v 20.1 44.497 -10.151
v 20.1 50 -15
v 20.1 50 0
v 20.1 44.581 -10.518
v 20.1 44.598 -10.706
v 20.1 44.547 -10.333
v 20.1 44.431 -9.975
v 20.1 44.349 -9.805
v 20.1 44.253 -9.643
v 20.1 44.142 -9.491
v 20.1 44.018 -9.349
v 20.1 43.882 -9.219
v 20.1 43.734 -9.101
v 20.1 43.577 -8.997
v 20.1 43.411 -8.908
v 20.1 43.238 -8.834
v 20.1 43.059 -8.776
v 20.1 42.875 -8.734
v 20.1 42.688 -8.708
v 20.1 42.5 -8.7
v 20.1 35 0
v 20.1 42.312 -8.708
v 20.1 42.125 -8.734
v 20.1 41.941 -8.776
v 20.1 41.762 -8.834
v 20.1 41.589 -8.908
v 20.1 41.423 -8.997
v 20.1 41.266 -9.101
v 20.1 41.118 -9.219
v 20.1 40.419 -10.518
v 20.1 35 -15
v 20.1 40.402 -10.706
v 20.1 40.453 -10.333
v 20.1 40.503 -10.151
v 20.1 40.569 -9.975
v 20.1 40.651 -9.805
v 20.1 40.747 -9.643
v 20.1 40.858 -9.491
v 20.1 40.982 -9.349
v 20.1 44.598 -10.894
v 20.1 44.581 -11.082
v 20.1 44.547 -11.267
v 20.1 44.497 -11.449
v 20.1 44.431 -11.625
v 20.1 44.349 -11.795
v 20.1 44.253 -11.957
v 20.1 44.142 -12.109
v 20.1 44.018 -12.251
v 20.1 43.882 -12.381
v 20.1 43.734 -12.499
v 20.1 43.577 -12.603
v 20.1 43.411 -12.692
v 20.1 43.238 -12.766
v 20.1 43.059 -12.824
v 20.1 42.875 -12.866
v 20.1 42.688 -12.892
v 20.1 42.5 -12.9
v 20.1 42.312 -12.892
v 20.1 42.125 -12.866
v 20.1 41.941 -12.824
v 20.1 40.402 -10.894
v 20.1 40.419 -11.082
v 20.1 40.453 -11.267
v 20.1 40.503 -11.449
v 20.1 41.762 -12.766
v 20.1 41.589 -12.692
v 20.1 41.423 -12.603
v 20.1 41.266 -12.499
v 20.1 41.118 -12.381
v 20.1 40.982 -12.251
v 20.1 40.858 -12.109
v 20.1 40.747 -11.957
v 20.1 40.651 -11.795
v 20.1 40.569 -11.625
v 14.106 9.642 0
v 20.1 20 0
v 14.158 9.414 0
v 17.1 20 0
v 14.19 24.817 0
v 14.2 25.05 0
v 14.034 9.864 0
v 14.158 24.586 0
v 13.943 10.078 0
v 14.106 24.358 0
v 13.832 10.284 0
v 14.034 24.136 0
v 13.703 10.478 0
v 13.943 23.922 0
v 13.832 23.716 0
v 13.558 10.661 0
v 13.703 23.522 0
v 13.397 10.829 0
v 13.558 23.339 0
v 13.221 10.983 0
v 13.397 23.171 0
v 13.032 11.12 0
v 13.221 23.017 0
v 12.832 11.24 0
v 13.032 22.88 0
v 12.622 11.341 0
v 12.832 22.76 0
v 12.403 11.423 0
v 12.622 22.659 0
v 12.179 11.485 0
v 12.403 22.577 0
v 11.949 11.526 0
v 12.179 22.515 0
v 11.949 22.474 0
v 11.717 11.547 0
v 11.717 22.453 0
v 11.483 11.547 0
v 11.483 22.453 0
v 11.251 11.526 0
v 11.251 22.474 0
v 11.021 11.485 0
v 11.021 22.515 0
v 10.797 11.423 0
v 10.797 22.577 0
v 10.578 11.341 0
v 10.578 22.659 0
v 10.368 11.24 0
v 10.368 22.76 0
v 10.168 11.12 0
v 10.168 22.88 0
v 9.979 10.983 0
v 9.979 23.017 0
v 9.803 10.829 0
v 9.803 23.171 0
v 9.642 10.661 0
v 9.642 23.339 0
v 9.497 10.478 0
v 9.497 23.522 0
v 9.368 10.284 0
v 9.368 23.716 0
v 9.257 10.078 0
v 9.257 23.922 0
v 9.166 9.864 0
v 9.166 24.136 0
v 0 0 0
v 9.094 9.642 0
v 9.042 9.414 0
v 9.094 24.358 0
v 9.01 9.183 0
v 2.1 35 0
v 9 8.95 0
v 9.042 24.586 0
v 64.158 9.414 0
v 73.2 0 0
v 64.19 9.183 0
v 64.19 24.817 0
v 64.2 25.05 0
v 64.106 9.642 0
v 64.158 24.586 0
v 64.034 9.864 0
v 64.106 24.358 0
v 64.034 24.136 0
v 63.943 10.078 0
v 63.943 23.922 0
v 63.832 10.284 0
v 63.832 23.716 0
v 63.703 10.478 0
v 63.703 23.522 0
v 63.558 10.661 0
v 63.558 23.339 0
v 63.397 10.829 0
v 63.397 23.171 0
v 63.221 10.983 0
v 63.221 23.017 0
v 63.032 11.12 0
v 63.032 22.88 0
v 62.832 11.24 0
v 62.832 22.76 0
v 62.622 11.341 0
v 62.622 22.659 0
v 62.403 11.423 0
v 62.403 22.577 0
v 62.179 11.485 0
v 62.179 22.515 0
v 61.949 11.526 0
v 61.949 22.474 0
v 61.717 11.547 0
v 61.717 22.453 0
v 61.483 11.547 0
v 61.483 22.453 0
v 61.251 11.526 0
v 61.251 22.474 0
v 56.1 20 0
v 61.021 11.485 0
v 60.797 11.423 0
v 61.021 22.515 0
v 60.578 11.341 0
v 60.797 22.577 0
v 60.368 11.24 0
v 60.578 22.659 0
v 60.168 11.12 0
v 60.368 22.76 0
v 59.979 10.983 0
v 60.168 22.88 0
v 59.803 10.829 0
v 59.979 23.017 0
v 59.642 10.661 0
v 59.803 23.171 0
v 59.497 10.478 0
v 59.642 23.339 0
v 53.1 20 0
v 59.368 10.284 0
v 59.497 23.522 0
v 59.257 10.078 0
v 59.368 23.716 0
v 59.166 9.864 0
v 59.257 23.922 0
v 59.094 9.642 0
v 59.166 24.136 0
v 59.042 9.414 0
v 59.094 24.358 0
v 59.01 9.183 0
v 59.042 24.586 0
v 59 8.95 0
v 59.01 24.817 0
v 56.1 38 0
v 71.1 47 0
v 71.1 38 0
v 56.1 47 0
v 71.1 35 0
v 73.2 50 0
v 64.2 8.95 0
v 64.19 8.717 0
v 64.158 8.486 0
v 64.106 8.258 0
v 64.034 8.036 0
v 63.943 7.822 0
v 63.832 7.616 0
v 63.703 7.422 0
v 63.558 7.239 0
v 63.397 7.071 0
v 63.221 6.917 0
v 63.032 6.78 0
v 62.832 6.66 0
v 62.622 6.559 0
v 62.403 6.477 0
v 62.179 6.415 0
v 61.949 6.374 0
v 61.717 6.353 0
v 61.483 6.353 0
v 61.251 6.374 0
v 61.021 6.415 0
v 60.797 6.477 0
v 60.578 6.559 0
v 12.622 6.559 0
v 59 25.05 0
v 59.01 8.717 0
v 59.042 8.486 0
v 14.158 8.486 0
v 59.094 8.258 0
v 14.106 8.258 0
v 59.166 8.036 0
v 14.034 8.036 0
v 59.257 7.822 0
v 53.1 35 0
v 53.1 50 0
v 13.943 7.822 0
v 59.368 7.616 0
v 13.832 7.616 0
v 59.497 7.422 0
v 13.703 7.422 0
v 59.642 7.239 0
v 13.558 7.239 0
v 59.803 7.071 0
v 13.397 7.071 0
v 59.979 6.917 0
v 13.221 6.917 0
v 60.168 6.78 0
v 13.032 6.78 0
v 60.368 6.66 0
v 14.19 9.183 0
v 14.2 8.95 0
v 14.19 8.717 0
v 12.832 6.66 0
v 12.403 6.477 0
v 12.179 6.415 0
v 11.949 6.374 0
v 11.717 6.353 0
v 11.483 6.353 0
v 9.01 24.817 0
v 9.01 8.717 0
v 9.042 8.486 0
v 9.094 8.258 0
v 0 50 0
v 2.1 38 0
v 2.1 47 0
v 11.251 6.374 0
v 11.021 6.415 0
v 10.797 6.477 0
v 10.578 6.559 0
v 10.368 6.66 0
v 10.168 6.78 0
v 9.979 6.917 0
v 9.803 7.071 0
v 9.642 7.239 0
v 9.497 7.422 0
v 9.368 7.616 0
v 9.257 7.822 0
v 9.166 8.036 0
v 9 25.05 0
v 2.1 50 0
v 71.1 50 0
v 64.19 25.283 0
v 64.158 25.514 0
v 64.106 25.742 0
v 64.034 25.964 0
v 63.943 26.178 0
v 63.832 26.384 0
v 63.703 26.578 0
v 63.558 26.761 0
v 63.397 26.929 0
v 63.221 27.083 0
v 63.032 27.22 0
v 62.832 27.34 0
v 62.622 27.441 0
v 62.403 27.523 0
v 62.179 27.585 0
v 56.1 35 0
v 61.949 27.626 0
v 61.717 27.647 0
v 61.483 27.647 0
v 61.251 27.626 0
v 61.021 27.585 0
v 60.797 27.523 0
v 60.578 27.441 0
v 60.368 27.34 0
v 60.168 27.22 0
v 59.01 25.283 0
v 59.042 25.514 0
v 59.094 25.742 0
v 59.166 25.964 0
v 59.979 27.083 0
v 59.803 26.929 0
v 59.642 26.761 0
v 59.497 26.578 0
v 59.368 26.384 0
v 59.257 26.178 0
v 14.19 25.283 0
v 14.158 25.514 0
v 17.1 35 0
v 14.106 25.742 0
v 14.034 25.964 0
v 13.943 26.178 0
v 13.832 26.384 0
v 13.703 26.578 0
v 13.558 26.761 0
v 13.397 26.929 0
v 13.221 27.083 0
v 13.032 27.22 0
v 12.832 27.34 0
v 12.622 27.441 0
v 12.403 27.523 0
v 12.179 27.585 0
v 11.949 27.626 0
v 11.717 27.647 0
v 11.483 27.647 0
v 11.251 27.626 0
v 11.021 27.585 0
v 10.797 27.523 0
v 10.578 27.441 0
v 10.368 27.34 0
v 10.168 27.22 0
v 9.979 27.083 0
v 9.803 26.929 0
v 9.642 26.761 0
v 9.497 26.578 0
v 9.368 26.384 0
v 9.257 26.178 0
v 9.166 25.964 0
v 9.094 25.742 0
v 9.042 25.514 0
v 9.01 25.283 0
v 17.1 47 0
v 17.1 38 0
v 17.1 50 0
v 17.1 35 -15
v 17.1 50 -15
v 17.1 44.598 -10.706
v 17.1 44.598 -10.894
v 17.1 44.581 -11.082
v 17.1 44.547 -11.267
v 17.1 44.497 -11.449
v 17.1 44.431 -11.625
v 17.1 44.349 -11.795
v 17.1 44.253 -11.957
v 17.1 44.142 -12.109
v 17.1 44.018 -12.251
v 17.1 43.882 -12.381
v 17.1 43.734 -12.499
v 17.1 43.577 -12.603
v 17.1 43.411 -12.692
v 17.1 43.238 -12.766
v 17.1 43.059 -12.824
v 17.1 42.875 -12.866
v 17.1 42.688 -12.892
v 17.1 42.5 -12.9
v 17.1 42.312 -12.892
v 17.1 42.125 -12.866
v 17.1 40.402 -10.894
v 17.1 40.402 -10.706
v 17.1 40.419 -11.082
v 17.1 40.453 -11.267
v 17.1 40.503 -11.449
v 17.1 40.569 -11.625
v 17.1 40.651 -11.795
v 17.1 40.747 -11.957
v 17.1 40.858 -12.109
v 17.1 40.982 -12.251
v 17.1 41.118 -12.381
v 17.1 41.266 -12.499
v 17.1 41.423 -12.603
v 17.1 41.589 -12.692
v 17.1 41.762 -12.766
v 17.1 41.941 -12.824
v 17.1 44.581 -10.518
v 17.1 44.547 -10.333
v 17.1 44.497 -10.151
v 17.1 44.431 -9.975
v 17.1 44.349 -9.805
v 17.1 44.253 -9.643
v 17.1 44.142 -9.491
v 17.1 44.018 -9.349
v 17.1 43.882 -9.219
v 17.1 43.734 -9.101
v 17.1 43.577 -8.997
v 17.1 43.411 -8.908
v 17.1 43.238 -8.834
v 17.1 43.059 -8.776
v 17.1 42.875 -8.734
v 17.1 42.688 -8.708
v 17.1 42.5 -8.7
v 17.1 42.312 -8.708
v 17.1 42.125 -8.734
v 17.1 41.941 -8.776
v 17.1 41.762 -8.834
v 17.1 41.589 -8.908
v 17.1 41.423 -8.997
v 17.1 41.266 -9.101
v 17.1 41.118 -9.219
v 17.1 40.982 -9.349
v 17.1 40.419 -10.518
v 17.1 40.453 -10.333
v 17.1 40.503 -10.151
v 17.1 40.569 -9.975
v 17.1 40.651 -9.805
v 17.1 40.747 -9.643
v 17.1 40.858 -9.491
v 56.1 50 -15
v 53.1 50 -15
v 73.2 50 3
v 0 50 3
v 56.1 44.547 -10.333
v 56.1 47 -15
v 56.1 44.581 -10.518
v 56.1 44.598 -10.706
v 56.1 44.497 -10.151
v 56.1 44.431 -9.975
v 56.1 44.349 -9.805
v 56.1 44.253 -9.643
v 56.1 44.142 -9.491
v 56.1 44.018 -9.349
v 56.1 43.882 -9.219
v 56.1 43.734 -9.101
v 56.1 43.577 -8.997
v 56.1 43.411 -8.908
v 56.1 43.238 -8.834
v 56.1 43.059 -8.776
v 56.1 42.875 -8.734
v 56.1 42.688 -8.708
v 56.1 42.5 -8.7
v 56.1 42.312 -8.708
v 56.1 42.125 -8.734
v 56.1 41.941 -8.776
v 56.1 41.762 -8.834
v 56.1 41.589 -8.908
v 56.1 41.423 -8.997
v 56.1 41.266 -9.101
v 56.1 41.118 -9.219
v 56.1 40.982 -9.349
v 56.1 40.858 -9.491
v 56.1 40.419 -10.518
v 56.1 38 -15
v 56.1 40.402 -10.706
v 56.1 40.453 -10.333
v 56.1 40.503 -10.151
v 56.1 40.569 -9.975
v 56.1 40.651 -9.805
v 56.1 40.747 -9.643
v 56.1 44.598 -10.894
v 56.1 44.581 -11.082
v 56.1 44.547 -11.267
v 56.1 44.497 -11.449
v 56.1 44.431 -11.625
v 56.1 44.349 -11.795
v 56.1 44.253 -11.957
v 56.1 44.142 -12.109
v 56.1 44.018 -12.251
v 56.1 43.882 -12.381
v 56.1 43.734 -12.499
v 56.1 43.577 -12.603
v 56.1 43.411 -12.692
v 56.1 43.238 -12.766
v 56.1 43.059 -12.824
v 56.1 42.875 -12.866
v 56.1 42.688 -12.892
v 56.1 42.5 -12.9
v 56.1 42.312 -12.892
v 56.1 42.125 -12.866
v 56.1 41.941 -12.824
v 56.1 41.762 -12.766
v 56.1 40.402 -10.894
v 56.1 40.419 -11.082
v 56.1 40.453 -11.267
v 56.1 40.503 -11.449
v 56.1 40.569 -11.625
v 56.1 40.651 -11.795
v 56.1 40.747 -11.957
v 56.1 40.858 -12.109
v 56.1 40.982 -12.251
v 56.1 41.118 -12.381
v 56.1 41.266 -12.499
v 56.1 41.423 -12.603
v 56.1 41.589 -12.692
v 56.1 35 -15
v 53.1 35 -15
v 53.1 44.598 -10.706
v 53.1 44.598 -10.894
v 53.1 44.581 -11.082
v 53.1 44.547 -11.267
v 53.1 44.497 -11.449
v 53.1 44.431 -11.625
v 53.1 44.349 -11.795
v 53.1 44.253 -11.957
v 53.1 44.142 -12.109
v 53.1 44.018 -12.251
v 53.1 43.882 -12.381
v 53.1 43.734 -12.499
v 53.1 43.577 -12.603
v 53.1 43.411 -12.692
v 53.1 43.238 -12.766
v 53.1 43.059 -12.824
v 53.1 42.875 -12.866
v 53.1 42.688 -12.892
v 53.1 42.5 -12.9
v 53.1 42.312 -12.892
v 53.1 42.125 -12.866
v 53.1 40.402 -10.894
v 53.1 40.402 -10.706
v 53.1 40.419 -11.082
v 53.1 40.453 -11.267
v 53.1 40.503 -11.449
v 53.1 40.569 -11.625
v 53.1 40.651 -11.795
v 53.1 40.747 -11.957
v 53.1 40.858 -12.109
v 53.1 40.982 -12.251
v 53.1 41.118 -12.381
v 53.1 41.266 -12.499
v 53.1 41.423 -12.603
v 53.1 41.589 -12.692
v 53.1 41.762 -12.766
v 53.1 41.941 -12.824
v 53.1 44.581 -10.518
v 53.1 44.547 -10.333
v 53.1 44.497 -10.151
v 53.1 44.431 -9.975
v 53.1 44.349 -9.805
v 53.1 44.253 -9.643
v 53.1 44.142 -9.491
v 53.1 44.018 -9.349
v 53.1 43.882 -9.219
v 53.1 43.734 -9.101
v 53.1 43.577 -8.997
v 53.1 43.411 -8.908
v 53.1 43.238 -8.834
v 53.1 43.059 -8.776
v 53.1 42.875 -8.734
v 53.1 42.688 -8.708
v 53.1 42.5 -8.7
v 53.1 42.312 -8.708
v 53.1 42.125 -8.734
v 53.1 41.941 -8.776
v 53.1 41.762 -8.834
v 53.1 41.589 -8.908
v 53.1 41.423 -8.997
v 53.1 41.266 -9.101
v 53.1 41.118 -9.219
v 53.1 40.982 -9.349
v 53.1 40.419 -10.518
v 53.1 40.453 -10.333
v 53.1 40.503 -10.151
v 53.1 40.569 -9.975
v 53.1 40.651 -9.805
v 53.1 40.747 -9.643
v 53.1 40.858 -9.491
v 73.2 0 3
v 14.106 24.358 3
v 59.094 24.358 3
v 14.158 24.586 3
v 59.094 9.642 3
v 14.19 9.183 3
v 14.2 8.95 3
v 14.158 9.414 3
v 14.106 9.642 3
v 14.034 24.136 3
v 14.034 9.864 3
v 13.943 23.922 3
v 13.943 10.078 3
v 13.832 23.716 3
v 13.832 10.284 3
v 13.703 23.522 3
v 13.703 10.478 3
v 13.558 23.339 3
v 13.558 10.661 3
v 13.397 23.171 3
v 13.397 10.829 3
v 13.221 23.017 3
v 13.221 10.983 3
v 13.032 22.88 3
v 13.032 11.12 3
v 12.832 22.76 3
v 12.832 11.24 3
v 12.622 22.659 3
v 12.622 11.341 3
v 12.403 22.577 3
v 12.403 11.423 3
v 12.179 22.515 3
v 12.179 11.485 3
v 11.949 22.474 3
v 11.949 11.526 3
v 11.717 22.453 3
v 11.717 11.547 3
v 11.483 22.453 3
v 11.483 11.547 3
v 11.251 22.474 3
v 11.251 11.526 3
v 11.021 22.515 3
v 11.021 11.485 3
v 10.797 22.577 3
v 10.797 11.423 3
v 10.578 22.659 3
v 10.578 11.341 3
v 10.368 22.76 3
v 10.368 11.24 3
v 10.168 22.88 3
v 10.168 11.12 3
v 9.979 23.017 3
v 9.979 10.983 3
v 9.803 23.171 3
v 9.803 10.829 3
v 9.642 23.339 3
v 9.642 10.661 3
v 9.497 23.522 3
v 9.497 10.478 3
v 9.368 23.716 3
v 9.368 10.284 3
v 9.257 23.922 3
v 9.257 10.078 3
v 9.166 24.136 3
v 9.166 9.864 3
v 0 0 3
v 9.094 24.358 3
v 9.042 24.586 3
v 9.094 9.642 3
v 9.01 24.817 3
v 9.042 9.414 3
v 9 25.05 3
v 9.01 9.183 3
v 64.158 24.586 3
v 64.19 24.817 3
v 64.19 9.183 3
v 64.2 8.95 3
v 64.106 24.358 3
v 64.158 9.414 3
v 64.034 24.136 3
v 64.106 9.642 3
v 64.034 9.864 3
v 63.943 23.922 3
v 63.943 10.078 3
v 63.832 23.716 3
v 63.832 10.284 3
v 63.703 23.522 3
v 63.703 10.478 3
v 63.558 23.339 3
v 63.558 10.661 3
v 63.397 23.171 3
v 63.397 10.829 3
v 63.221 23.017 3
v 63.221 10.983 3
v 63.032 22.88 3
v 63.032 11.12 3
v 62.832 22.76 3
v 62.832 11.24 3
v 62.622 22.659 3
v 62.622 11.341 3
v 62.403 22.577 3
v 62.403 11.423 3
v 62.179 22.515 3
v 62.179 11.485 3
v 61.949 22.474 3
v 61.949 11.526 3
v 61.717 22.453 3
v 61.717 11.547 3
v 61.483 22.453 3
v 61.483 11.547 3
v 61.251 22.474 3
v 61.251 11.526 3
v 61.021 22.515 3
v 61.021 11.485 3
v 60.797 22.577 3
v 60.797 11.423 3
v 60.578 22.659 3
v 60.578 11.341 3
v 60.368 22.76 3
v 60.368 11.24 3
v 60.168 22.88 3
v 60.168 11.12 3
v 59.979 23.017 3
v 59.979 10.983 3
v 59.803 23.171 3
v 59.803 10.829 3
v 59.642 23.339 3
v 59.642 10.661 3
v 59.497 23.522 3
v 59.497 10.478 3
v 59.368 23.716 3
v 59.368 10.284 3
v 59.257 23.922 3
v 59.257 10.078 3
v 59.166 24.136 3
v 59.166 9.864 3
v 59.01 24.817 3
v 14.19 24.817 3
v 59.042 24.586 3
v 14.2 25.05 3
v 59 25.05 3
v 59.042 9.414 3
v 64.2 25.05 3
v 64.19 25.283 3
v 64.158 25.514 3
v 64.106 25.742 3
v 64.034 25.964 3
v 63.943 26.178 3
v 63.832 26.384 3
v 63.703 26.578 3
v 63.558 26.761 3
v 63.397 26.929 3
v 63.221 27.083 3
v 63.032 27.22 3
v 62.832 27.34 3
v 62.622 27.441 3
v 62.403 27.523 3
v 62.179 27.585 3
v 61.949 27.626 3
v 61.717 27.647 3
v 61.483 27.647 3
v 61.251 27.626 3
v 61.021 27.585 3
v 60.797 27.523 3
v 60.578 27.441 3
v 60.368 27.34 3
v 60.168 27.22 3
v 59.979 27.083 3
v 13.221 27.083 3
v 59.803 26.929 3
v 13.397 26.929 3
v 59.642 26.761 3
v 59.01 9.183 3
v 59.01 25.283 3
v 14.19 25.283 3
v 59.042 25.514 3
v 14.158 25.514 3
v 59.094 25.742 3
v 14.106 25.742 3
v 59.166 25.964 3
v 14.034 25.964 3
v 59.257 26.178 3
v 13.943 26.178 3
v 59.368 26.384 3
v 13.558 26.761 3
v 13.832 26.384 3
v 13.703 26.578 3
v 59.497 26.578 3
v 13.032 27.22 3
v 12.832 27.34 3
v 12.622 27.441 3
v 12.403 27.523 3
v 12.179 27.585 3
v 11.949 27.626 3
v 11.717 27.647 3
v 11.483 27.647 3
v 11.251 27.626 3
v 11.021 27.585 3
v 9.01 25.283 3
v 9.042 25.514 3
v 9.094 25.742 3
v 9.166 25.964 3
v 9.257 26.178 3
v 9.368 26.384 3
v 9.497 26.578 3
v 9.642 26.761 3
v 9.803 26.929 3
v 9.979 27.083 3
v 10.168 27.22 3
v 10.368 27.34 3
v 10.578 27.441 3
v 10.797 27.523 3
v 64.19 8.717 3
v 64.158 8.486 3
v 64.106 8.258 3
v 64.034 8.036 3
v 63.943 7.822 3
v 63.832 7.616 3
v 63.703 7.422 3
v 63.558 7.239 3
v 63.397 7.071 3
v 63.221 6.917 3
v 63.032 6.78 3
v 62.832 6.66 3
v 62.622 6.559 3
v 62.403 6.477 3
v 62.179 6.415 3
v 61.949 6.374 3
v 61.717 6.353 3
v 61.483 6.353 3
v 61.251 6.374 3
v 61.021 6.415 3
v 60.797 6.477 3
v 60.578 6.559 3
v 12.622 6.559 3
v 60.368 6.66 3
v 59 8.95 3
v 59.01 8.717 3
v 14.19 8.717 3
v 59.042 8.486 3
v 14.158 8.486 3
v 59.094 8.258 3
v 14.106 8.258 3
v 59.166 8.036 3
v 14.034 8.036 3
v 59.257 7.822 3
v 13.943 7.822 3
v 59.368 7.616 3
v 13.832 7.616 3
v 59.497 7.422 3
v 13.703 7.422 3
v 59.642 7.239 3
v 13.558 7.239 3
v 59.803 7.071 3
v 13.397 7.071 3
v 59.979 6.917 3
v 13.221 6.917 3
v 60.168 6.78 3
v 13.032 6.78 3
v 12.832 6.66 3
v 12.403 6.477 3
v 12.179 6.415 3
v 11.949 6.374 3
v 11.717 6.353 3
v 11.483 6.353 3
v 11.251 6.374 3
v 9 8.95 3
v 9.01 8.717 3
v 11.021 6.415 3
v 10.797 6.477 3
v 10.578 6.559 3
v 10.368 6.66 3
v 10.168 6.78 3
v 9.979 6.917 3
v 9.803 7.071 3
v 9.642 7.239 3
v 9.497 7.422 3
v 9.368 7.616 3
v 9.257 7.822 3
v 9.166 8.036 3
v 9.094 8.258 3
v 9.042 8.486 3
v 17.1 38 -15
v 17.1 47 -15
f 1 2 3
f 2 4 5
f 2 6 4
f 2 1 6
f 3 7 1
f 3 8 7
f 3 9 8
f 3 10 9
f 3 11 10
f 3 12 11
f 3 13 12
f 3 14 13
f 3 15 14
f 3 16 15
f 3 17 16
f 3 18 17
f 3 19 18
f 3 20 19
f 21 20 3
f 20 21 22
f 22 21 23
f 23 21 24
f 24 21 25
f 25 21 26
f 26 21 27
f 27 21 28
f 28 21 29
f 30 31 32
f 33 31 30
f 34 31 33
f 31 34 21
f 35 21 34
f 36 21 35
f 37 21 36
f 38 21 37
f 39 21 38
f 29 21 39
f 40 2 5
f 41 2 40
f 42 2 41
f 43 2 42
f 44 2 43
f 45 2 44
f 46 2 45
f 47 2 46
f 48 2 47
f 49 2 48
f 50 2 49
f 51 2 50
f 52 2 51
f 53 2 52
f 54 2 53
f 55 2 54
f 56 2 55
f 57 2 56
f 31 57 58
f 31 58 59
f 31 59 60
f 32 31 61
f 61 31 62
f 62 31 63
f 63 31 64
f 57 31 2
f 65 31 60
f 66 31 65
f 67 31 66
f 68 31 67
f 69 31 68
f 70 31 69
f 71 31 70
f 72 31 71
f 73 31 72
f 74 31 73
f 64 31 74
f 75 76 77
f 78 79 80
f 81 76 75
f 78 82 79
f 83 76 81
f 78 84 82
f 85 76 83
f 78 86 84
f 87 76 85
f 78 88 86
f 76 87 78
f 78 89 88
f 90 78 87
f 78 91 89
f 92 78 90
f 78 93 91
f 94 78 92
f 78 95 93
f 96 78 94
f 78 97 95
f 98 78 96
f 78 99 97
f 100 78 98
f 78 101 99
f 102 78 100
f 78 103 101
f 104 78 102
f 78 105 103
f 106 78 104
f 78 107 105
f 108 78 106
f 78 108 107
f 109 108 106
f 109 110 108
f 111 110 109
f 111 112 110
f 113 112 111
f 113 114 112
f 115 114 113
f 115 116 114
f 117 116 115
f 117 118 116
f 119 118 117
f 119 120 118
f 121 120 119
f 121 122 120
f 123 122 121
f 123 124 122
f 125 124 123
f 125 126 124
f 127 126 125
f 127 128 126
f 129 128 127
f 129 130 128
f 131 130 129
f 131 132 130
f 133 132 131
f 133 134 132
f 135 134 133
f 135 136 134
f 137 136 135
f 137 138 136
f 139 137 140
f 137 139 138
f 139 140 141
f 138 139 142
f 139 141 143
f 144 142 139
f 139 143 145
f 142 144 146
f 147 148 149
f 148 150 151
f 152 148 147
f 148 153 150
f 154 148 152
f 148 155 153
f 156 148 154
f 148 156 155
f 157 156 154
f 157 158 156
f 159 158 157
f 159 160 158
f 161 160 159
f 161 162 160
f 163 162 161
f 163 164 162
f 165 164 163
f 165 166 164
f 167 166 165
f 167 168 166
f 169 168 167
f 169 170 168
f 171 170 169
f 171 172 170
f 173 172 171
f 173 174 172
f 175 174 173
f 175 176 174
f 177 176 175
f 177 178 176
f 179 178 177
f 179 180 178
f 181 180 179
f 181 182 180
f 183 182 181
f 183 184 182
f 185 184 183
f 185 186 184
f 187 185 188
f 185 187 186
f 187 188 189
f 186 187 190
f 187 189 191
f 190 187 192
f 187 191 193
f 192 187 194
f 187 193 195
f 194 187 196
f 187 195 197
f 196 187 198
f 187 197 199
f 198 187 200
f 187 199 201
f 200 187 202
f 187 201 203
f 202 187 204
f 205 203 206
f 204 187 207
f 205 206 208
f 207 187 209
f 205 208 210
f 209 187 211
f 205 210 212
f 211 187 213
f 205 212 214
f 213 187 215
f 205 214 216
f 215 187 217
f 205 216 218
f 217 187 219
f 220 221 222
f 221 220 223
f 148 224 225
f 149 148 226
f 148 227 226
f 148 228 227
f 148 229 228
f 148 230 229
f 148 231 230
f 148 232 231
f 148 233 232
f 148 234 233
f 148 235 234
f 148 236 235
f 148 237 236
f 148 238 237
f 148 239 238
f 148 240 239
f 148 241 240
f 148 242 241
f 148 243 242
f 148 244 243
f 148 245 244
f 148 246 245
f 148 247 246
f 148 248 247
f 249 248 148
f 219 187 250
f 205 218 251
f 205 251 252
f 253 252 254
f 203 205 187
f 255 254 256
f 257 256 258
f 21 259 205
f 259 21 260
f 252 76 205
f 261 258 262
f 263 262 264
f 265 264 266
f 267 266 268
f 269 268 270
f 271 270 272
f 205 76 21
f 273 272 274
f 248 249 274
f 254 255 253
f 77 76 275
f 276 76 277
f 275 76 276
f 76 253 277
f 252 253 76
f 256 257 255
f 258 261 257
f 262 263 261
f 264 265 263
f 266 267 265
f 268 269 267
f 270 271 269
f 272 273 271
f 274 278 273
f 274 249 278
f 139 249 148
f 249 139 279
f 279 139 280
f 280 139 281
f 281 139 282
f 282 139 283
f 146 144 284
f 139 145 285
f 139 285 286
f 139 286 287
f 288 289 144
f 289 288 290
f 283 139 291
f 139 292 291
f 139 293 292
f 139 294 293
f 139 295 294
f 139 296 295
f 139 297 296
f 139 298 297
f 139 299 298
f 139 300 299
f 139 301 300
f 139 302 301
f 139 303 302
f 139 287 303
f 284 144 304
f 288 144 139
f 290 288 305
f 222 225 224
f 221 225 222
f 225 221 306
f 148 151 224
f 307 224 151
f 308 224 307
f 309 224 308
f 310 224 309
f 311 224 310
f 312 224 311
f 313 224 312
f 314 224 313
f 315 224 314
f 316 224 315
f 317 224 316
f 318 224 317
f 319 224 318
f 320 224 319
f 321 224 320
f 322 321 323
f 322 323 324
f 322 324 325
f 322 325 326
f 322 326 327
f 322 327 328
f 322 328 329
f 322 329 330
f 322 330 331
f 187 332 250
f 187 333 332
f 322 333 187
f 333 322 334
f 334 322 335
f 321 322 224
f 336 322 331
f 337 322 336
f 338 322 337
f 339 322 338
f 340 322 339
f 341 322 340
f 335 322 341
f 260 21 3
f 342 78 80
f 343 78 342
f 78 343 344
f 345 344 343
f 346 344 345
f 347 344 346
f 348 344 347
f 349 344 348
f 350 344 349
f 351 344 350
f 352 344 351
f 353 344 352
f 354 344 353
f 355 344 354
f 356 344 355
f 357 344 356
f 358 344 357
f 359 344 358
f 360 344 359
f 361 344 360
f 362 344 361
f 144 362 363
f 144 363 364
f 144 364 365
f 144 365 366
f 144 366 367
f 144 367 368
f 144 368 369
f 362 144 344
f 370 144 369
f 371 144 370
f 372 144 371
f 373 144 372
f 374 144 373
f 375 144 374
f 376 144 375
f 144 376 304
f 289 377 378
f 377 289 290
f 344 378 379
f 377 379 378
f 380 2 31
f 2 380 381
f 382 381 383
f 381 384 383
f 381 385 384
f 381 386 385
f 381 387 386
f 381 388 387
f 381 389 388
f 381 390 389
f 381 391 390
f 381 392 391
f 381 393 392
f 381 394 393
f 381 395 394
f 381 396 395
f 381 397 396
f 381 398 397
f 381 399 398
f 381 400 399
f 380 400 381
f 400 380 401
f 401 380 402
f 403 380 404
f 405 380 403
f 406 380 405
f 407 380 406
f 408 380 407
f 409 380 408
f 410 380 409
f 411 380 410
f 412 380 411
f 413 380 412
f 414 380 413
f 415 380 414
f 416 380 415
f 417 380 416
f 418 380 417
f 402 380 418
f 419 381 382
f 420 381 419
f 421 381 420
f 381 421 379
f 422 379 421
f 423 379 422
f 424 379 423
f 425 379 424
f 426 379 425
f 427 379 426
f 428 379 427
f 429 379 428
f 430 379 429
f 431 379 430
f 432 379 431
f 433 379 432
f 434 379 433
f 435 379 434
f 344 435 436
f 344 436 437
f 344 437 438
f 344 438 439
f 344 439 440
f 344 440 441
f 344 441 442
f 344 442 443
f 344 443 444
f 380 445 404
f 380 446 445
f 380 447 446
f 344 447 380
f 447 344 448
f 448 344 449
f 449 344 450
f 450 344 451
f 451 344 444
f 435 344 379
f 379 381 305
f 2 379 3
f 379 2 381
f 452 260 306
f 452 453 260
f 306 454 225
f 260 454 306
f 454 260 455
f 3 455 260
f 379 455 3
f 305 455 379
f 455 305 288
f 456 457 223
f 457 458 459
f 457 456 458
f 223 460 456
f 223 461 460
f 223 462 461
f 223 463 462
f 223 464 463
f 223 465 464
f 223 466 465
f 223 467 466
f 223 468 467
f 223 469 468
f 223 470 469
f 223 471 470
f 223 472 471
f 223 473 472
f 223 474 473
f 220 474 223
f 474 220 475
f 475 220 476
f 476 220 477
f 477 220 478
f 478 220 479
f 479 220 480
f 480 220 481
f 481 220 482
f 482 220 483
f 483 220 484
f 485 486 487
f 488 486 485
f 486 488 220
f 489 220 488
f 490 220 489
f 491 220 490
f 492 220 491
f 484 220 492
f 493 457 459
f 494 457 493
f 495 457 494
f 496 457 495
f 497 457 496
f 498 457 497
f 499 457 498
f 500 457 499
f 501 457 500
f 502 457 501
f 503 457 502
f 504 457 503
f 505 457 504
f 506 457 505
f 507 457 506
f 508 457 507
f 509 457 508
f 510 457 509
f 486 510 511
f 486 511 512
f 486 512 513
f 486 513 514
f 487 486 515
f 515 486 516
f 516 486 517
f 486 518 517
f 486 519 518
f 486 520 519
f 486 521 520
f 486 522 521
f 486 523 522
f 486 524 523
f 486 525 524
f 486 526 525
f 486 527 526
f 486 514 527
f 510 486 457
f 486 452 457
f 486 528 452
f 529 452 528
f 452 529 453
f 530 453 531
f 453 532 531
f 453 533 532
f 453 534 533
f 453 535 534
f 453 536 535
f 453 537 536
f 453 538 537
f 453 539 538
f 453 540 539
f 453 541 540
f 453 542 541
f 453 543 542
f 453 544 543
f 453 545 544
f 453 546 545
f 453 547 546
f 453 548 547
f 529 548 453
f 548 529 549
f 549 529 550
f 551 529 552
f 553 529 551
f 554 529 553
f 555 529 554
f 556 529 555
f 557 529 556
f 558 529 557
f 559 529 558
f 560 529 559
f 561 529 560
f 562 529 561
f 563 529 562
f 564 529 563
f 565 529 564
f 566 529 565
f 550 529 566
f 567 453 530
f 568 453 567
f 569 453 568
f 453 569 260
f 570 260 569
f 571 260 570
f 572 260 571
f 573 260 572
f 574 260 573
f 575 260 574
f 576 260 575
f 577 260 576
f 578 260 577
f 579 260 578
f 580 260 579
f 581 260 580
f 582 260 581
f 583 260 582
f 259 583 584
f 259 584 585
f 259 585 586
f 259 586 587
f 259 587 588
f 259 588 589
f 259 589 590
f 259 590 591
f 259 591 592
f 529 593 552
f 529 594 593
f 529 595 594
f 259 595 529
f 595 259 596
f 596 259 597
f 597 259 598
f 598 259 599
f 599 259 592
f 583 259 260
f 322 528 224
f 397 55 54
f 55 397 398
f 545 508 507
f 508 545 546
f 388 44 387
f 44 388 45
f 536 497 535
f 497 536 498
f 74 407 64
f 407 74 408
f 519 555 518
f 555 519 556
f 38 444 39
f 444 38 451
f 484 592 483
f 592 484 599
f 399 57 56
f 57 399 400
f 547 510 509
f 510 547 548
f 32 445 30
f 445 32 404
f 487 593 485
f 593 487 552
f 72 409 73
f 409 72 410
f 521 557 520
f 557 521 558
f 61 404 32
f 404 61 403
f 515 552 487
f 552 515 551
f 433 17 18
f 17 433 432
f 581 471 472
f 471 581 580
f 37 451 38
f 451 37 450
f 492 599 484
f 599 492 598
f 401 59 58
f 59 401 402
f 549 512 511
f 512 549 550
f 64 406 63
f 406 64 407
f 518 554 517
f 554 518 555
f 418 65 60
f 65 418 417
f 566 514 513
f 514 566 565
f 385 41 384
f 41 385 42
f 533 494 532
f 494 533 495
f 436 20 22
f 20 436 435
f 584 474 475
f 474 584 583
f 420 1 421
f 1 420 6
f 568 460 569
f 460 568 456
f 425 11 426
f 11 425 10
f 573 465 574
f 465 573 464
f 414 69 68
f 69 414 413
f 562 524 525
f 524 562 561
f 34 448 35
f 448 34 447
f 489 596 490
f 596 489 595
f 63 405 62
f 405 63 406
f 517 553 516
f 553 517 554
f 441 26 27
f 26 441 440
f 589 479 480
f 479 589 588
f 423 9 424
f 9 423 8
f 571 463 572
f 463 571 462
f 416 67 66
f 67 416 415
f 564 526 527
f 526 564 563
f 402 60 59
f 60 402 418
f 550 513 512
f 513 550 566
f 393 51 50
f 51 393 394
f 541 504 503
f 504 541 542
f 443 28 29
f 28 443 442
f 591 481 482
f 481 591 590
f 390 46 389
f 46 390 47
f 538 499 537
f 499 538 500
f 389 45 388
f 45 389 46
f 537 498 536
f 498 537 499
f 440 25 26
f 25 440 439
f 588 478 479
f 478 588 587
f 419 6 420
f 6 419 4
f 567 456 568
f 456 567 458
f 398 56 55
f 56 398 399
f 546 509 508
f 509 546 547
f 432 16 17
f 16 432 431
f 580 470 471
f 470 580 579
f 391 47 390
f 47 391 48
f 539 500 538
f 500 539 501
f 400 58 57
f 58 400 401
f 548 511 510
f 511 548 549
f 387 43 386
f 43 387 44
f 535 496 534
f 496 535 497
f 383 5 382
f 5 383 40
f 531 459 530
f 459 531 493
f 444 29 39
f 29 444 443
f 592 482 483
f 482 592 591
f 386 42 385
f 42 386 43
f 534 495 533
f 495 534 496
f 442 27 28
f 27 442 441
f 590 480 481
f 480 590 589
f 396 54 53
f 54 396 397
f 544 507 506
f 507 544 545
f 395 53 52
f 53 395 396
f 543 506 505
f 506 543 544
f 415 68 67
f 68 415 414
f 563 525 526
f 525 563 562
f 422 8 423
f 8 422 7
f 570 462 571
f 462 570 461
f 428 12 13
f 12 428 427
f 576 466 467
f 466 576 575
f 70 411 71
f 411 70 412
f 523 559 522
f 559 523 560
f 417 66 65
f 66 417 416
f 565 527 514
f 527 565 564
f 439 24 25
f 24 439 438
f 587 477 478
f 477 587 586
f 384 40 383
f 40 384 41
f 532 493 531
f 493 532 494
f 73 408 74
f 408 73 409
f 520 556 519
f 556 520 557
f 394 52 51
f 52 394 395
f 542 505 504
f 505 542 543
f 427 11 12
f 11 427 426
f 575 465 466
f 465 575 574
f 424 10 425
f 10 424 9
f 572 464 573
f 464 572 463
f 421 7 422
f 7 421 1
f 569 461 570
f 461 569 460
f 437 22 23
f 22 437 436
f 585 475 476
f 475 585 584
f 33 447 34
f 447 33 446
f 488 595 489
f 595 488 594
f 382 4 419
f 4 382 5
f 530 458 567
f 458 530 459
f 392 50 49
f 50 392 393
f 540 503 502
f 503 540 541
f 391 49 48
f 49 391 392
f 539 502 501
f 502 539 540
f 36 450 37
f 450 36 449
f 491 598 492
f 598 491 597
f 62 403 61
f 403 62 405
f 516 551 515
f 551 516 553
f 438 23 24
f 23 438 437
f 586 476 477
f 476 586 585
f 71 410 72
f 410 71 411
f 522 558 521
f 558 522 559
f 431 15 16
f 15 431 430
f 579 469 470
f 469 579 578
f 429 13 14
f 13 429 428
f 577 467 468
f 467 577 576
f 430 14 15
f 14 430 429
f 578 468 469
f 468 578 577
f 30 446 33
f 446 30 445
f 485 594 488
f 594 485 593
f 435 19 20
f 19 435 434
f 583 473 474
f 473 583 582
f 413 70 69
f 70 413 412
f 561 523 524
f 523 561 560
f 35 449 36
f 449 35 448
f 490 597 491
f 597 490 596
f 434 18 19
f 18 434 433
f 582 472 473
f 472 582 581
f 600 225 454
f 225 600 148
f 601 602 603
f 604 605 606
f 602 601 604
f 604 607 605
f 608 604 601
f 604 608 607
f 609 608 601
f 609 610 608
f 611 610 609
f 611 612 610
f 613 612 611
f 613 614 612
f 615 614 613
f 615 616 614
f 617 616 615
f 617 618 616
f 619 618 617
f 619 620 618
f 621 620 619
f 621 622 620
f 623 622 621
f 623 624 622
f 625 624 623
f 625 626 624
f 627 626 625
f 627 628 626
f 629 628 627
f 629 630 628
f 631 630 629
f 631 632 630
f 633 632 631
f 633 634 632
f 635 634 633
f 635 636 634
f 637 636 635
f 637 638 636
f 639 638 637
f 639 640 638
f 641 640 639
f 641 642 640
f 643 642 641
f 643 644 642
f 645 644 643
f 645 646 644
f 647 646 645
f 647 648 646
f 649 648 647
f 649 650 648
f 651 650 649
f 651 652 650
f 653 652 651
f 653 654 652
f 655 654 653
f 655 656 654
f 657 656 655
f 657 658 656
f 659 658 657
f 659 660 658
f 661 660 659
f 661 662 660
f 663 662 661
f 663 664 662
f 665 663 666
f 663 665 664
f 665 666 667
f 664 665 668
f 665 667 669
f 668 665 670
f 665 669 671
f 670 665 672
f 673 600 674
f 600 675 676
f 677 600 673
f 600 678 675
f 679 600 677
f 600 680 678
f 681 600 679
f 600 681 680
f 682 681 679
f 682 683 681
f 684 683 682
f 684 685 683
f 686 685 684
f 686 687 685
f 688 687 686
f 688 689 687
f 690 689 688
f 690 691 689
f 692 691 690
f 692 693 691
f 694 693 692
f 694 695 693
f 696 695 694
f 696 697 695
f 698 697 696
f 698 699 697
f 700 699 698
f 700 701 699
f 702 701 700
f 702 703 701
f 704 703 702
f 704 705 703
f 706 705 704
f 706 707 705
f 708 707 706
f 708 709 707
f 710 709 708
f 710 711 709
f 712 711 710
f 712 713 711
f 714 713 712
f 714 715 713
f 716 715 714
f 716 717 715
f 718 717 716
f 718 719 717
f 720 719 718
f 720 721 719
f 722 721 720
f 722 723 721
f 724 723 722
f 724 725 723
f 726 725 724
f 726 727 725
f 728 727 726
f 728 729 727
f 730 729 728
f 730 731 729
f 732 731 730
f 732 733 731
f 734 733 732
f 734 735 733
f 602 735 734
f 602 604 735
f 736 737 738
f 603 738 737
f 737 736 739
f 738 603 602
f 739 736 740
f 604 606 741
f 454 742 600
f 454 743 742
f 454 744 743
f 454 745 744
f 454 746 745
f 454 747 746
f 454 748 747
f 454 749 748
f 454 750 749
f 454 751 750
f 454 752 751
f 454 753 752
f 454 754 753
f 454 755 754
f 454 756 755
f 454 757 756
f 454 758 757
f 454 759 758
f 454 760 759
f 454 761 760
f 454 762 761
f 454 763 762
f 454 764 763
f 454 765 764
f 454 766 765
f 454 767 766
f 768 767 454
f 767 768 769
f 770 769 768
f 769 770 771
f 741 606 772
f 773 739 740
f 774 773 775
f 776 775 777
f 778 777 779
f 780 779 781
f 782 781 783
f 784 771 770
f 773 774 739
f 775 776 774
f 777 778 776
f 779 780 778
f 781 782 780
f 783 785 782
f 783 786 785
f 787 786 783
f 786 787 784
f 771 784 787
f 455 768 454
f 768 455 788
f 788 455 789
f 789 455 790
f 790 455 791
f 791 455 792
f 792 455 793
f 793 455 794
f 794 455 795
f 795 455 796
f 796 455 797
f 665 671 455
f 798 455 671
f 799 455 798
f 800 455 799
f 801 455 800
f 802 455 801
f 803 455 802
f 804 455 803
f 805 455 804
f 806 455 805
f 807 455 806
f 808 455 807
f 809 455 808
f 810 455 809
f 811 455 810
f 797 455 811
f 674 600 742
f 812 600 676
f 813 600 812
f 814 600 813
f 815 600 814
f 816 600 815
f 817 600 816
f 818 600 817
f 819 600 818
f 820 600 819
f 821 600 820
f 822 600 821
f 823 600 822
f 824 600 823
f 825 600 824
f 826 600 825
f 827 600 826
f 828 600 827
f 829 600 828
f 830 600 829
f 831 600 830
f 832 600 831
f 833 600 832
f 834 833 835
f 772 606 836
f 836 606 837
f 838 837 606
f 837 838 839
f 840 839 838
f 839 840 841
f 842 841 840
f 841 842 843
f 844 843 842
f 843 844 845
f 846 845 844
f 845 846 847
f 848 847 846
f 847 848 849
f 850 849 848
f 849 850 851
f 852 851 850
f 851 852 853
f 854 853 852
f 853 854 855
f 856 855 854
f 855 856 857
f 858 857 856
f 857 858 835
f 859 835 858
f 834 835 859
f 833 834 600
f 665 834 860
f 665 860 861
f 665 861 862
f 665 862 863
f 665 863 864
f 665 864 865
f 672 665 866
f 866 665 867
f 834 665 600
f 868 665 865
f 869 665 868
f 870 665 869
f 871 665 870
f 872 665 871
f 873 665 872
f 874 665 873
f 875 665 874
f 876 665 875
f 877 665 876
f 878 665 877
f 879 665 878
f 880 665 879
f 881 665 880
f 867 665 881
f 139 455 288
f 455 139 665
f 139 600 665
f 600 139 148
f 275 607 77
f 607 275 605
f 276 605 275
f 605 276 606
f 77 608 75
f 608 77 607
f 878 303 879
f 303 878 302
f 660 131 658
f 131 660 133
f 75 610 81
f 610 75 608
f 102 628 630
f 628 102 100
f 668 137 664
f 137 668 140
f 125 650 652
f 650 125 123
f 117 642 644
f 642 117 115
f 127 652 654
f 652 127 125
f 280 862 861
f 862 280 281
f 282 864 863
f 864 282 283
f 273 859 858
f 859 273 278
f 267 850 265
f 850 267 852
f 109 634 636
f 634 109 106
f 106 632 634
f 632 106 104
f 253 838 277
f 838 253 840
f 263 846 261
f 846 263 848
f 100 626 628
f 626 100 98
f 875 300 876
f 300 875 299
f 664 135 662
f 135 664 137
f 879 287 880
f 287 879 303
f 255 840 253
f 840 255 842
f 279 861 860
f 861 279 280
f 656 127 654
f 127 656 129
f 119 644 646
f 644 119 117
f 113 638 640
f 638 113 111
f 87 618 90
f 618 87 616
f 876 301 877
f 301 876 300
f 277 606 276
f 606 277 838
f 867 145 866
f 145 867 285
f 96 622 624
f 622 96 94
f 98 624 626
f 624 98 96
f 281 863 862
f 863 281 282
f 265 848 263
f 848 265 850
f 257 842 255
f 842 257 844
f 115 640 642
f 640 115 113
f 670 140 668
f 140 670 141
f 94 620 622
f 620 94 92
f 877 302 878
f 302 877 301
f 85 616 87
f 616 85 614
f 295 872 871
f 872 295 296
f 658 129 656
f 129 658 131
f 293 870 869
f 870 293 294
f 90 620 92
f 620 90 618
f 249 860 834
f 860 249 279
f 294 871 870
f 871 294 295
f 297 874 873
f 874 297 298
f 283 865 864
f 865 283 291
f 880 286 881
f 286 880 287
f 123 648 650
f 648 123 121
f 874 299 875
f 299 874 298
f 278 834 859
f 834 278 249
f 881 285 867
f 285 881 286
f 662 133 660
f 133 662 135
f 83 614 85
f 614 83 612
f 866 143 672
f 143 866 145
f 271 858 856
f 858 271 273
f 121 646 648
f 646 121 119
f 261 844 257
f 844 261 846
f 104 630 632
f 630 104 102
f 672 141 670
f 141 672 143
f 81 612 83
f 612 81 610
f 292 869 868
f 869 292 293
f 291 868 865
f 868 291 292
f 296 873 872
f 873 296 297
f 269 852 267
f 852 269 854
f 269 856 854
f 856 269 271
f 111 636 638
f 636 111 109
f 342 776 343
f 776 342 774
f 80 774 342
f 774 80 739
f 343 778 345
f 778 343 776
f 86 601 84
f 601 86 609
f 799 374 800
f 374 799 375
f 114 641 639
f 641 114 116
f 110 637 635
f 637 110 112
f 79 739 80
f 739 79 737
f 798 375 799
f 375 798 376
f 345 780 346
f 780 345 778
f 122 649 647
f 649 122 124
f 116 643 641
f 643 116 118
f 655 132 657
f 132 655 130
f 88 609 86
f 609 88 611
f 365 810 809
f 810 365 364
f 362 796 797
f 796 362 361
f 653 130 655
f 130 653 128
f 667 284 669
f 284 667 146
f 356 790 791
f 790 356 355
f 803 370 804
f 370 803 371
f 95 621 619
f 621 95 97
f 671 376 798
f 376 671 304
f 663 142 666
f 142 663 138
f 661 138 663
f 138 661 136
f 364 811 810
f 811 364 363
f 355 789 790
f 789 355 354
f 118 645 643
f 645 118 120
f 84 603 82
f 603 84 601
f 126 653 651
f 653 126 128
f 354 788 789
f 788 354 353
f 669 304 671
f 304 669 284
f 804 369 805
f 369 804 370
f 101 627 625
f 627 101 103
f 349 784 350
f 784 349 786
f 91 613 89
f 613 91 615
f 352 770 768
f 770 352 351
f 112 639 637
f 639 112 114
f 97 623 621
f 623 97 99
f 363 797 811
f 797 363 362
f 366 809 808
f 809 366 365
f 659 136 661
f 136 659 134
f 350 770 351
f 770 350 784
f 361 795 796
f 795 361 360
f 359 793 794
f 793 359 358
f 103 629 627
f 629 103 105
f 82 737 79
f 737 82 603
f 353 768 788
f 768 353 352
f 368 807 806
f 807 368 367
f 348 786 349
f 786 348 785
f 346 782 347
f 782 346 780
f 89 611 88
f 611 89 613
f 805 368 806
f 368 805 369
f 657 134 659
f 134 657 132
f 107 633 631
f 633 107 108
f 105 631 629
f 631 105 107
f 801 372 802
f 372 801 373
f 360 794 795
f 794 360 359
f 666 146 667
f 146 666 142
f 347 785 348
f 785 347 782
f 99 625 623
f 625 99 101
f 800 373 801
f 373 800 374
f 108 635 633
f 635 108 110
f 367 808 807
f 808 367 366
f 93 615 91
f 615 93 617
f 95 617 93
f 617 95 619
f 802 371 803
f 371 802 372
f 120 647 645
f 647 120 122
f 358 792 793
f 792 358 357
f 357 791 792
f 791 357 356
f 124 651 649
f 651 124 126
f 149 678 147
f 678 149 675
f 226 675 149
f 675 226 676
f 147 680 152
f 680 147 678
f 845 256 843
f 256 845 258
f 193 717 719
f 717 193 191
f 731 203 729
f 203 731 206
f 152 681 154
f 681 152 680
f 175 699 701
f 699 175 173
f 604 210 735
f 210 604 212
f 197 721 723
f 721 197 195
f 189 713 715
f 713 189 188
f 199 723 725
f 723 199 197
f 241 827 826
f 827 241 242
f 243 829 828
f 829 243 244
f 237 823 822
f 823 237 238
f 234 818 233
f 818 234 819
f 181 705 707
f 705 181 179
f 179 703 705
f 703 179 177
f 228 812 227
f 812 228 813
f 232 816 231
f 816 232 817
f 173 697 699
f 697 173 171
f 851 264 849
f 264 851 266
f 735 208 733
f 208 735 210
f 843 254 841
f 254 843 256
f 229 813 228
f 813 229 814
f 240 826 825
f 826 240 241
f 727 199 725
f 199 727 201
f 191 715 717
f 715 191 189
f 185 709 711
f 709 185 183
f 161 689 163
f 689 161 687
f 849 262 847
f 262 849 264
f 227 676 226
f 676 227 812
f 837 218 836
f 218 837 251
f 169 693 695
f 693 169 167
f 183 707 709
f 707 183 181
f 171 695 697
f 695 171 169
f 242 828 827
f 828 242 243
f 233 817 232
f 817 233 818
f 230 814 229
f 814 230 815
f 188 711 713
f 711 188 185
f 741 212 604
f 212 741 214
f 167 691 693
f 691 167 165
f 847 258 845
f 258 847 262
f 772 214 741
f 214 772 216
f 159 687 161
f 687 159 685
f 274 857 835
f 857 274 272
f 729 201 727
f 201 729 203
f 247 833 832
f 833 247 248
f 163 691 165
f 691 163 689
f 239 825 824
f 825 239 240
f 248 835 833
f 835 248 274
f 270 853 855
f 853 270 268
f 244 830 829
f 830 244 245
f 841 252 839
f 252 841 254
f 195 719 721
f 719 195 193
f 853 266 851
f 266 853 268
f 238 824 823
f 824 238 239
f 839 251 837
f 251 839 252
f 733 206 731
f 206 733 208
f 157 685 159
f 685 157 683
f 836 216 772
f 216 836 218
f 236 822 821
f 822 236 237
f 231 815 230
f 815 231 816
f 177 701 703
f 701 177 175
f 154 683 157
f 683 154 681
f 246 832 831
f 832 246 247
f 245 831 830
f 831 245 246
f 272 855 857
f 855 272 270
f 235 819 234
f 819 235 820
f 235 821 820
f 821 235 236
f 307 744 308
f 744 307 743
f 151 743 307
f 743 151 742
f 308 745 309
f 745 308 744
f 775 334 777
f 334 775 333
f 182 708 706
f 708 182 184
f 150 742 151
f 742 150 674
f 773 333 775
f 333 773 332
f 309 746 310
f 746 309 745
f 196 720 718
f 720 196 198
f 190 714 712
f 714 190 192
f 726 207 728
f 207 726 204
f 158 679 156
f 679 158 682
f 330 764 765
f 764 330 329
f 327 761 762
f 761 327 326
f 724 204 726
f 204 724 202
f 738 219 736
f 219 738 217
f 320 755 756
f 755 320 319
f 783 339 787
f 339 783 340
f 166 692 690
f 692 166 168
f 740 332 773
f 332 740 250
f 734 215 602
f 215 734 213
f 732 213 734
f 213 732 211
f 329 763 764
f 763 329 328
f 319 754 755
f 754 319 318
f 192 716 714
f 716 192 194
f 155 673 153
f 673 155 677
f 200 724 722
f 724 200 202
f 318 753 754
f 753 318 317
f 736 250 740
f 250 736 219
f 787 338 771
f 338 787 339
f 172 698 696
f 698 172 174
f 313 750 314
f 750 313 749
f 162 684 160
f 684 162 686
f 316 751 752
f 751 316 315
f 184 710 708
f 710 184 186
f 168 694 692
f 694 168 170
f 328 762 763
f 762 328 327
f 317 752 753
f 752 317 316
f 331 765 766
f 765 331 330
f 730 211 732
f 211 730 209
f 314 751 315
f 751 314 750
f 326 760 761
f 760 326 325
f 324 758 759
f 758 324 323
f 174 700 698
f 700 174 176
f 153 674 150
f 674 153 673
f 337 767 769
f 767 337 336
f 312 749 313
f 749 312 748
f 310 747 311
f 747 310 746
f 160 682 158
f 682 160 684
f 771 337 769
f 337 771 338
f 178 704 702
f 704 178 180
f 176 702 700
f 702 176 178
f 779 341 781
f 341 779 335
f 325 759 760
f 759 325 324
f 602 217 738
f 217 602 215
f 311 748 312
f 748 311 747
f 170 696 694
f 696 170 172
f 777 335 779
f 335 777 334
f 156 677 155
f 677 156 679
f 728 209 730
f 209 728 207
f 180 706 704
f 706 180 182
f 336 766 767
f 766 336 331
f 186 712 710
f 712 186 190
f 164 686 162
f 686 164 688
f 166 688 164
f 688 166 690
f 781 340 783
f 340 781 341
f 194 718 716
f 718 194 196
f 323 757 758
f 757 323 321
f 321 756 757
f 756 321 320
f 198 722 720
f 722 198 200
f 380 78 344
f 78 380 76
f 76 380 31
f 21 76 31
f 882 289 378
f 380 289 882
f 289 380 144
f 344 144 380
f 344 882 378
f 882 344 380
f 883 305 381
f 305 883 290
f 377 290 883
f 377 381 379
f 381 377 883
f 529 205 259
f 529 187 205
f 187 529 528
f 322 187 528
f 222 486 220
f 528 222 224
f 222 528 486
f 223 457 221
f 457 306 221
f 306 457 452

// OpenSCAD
/*
Use demo(); to see the full part

To print: 
- export one STL of mounting_blank() and print 2x
- export one STL of mounting_plate() and print 1x
*/

$fn=70;
front_panel_thickness = 3;
part_width = 23.2 + 50;
part_height = 50;

tabs_height = 15; //how tall are they when oriented in the car
tabs_depth = 15; // how far do they stick out into the car; z axis
space_between_tabs = 33+front_panel_thickness;

screw_hole_diameter = 4.2;

hole_tap_size=4.8;
hole_clearance_size=5.2;
hole_shell=3;
screw_depth=8;

gap_between_blanks = 50;

the_x_factor=33;

module mounting_blank() {
    difference() {
        union() {
            translate([15.1,8.5,0]) import("2nd_Gen_Tacoma_Switch_Blank_Center_Console.stl");
            translate([11.6,8.95,3.9]) cylinder(r=hole_tap_size/2+hole_shell,h=screw_depth);
            translate([11.6,25.05,3.9]) cylinder(r=hole_tap_size/2+hole_shell,h=screw_depth);
        }
        translate([11.6,8.95,0]) cylinder(r=hole_tap_size/2,h=screw_depth+front_panel_thickness+5);
        translate([11.6,25.05,0]) cylinder(r=hole_tap_size/2,h=screw_depth+front_panel_thickness+5);
    }
}

module mounting_blank_cutout() {
    translate([11.6,8.95,0]) cylinder(r=hole_clearance_size/2,h=screw_depth+front_panel_thickness+5);
    translate([11.6,25.05,0]) cylinder(r=hole_clearance_size/2,h=screw_depth+front_panel_thickness+5);
}

module mounting_plate() {
    tab_edge_x = (part_width-space_between_tabs-front_panel_thickness)/2;
    tab_edge_y = part_height-tabs_height;
    difference() {
        union() {
            cube([part_width,part_height,front_panel_thickness]);
        
            translate([tab_edge_x,tab_edge_y,-tabs_depth]) difference() { 
                    union() {
                    translate([0,0,0]) cube([front_panel_thickness,tabs_height,tabs_depth]);
                    translate([space_between_tabs,0,0]) cube([front_panel_thickness,tabs_height,tabs_depth]);
                }
                translate([0,tabs_height/2,screw_hole_diameter]) rotate([0,90,0]) cylinder(r=screw_hole_diameter/2,h=space_between_tabs+2*front_panel_thickness);
            }
        }
            mounting_blank_cutout();
            translate([gap_between_blanks,0,0]) mounting_blank_cutout();
    }
    // Left tab triangle
    translate([tab_edge_x,tab_edge_y-tabs_depth,0]) rotate([0,90,0]) linear_extrude(height=front_panel_thickness) polygon(points=[[0,0],[0,tabs_depth],[tabs_depth,tabs_depth]]);
    translate([tab_edge_x-tabs_depth,tab_edge_y+front_panel_thickness,0]) rotate([90,90,0]) linear_extrude(height=front_panel_thickness) polygon(points=[[0,0],[0,tabs_depth],[tabs_depth,tabs_depth]]);
    translate([tab_edge_x-tabs_depth,part_height,0]) rotate([90,90,0]) linear_extrude(height=front_panel_thickness) polygon(points=[[0,0],[0,tabs_depth],[tabs_depth,tabs_depth]]);
    
    // Right tab triangle
    translate([tab_edge_x + space_between_tabs,tab_edge_y-tabs_depth,0]) rotate([0,90,0]) linear_extrude(height=front_panel_thickness) polygon(points=[[0,0],[0,tabs_depth],[tabs_depth,tabs_depth]]);
    translate([tabs_depth+tab_edge_x+front_panel_thickness+space_between_tabs,tab_edge_y,0]) rotate([-90,90,0]) linear_extrude(height=front_panel_thickness) polygon(points=[[0,0],[0,tabs_depth],[tabs_depth,tabs_depth]]);
    translate([tabs_depth+tab_edge_x+front_panel_thickness+space_between_tabs,part_height-front_panel_thickness,0]) rotate([-90,90,0]) linear_extrude(height=front_panel_thickness) polygon(points=[[0,0],[0,tabs_depth],[tabs_depth,tabs_depth]]);
}

module demo() {
    translate([0,0,front_panel_thickness]) union() {
        mounting_blank();
        translate([gap_between_blanks,0,0]) mounting_blank();
    }
    mounting_plate();
}

//demo();
//mounting_blank();
mounting_plate();
